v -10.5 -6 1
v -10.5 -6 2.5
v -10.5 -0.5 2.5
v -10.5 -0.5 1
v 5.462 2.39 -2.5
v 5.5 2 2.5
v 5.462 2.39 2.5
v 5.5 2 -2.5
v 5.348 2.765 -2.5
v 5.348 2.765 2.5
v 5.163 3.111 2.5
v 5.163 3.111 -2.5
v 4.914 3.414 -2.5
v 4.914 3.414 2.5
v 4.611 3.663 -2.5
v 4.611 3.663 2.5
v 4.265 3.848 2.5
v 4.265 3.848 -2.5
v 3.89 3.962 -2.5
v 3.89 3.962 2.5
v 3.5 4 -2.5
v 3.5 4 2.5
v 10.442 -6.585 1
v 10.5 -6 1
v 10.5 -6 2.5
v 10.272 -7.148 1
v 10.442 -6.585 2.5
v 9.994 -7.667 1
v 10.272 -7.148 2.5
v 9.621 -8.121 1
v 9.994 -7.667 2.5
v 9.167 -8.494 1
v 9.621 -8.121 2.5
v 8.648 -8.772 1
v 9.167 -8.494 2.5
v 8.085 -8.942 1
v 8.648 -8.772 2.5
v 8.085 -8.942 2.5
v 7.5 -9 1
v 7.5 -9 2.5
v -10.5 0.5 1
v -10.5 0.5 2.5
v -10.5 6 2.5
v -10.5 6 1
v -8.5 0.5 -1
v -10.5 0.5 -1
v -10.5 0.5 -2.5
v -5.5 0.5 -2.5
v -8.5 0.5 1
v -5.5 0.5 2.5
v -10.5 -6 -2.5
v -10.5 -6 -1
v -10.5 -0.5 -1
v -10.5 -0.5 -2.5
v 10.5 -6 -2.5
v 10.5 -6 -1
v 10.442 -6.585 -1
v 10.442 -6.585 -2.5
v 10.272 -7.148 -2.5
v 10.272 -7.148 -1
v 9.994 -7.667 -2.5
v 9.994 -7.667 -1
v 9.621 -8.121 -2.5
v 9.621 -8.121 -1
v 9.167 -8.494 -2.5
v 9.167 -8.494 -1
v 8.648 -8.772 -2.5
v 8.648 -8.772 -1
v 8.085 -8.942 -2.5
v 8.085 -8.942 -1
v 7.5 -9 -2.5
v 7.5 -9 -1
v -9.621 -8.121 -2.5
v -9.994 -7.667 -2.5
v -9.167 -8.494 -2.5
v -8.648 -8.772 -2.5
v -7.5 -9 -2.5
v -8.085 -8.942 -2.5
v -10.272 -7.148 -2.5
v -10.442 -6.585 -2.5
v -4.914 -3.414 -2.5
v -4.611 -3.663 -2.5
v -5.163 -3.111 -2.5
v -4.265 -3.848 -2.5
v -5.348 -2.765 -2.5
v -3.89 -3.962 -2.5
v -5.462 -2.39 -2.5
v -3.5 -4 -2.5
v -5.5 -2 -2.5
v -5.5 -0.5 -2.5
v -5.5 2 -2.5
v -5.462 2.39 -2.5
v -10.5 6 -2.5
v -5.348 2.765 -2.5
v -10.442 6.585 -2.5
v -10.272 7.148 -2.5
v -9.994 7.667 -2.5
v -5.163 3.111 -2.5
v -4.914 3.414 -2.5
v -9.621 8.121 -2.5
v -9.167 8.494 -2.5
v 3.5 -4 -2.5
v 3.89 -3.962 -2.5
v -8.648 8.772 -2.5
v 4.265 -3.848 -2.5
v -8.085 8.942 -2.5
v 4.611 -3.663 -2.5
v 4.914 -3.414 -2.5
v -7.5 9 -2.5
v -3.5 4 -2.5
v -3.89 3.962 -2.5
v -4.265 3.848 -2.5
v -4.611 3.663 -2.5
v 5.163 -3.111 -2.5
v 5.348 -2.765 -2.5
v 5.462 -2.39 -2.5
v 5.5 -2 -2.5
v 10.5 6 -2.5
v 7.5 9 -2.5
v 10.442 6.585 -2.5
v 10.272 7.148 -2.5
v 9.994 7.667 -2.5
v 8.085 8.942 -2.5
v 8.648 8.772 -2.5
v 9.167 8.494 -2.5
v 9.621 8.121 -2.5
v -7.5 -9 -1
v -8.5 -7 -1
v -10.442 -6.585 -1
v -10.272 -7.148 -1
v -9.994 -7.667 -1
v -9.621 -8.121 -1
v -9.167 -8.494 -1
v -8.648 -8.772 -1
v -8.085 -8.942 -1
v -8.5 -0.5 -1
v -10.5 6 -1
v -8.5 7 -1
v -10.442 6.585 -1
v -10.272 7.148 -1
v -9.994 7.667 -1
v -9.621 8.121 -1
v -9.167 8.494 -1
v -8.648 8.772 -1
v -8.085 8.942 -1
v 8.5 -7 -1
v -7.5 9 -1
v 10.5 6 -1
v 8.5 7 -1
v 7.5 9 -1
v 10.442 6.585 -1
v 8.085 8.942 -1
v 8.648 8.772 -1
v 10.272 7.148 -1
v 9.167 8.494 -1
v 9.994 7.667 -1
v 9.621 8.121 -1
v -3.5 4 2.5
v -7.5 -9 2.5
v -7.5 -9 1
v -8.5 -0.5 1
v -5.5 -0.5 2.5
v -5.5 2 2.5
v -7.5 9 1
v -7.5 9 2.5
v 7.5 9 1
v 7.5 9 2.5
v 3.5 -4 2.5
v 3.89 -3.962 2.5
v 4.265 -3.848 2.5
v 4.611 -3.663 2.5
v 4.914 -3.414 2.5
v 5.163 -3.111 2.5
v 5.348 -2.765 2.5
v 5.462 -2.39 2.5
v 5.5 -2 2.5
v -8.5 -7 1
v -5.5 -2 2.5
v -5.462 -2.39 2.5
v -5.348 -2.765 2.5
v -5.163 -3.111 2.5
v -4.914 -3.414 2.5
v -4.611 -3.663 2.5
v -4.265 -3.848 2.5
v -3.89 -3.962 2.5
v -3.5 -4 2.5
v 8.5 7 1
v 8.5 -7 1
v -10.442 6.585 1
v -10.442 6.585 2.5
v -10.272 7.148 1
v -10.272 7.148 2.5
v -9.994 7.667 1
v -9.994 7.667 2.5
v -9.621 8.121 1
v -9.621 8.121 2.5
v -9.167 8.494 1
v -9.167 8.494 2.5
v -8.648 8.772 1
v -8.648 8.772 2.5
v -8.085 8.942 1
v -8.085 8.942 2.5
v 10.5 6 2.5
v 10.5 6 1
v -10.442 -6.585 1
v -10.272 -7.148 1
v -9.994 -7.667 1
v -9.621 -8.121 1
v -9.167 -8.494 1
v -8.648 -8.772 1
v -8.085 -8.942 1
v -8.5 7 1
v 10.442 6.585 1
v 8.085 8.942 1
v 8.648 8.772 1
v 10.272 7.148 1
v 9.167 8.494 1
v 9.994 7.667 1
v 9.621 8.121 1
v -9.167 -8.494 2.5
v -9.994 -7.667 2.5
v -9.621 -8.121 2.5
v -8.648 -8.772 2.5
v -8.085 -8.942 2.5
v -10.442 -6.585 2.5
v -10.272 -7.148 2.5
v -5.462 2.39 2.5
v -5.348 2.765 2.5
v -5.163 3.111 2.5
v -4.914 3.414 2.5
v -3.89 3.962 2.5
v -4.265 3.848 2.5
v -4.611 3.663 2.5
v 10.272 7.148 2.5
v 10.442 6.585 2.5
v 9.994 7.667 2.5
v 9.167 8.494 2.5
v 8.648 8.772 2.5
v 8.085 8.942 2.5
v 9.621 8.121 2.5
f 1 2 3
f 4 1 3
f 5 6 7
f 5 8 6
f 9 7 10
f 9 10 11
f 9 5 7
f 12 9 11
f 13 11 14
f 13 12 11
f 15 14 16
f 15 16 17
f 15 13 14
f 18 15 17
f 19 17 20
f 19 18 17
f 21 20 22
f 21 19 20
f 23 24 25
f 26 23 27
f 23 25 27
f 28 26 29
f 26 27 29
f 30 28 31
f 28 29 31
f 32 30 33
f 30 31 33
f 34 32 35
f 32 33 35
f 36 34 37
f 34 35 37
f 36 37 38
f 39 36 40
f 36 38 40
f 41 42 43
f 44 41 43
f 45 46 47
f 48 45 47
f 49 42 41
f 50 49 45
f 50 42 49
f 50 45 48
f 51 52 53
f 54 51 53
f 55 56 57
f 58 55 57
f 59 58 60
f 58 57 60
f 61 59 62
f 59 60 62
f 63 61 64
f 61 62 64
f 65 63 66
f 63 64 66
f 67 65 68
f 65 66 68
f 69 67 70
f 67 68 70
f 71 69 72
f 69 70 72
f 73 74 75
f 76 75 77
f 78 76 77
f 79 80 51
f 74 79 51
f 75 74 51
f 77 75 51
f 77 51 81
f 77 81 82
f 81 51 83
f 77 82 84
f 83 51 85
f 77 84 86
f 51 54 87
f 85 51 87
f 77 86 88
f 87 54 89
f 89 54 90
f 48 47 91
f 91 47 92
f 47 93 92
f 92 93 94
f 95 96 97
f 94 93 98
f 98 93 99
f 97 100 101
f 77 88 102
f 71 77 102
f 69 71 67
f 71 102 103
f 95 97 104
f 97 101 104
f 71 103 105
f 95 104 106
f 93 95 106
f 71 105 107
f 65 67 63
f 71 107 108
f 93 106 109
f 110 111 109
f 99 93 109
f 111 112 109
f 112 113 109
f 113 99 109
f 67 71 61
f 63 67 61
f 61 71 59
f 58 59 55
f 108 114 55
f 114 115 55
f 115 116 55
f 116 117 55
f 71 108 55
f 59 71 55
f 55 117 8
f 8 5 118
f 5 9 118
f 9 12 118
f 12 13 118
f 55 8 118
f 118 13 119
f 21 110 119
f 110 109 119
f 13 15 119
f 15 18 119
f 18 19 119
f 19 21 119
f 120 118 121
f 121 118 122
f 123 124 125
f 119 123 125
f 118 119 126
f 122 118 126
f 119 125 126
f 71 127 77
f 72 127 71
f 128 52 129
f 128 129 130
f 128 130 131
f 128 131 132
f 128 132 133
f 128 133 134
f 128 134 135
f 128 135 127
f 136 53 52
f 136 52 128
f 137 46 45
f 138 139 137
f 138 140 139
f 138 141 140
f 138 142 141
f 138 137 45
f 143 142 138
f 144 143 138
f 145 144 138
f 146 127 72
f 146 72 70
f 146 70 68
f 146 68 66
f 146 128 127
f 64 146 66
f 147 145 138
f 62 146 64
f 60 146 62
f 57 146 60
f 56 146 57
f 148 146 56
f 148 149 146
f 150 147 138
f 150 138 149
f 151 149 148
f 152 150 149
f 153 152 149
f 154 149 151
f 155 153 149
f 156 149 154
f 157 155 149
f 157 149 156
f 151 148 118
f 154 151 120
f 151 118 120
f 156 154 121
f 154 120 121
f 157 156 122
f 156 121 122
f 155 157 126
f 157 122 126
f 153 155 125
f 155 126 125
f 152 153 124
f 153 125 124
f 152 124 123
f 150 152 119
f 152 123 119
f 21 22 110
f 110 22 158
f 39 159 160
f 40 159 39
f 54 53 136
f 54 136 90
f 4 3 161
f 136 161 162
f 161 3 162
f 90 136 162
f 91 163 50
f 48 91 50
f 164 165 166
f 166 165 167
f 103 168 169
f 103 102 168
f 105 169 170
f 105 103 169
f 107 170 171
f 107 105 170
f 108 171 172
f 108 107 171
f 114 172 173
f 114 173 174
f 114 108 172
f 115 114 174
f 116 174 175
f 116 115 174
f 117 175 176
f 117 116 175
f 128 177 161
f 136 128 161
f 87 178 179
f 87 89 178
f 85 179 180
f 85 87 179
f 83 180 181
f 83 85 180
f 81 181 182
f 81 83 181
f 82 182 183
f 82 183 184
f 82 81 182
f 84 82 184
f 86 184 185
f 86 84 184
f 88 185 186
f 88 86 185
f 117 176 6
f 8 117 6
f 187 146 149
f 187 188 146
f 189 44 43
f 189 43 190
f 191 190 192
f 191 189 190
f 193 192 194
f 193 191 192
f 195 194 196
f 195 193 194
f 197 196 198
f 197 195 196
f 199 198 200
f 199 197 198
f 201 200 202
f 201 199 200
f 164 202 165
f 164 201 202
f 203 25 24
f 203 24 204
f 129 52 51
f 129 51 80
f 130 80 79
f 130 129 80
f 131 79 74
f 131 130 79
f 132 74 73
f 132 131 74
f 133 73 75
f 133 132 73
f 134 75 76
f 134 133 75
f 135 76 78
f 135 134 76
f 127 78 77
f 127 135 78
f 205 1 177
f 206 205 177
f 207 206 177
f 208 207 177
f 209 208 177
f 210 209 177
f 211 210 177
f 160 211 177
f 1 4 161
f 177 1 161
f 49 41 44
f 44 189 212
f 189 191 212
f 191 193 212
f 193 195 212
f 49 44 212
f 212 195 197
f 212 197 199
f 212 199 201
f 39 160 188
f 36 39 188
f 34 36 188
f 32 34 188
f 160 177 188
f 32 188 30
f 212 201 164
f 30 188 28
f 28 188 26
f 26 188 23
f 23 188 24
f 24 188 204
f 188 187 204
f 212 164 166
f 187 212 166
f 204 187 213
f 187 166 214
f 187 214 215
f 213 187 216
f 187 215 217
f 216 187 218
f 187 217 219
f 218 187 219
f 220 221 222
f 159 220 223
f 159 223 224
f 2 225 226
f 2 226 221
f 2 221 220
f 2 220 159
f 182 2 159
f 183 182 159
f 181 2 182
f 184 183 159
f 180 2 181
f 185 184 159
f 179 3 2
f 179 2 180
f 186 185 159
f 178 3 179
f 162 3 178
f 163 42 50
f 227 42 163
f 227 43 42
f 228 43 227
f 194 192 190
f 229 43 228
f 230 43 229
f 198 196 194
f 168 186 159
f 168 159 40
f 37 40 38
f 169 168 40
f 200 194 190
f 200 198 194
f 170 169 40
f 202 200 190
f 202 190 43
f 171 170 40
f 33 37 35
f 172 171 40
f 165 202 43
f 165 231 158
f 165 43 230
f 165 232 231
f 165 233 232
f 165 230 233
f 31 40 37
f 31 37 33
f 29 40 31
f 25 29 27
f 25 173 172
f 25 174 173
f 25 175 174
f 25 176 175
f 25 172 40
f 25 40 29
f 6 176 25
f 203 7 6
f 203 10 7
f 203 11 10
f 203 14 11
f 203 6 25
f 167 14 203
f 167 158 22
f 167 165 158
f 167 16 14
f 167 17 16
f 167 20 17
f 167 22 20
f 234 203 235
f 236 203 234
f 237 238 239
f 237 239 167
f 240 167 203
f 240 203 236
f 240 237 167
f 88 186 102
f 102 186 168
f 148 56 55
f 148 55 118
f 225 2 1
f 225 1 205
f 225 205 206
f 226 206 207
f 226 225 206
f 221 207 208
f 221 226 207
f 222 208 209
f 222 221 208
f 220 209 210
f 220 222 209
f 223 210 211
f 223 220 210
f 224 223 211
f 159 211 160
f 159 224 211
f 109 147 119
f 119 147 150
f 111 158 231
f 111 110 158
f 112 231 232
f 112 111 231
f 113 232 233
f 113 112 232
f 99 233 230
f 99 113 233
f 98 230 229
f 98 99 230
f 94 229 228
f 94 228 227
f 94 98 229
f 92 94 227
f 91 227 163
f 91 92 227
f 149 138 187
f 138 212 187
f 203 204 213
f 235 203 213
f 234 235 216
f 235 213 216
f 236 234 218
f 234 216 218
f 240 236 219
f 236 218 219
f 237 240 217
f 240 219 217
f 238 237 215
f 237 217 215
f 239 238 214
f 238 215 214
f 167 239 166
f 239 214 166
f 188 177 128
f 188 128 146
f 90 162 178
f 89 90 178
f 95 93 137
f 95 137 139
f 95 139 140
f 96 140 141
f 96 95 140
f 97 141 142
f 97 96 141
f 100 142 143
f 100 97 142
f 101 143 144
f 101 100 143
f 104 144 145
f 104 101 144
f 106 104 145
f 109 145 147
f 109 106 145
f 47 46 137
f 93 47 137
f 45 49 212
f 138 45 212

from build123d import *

# Parameters (mm, degrees)
F0_W     = 21
F0_H     = 18
F0_W_2   = 17
F0_H_2   = 14
F1_DEPTH = 2.5
F2_R     = 3
F3_DEPTH = 1
F4_W     = 5
F4_H     = 1
F5_DEPTH = 25
F6_R     = 2


with BuildPart() as f1:
    # F0 (on Top) → F1 (new body, symmetric)
    with BuildSketch(Plane.XY):
        Rectangle(F0_W, F0_H)
        Rectangle(F0_W_2, F0_H_2, mode=Mode.SUBTRACT)
        Rectangle(F0_W_2, F0_H_2)
    extrude(amount=F1_DEPTH, both=True)

    # F2
    f2_edges = [f1.edges().sort_by_distance(p)[0] for p in [
        (10.5, -9, 0),
        (10.5, 9, 0),
        (-10.5, 9, 0),
        (-10.5, -9, 0),
    ]]
    fillet(f2_edges, radius=F2_R)

    # F0 (on Top) → F3 (cut, symmetric)
    with BuildSketch(Plane.XY):
        Rectangle(F0_W, F0_H)
        Rectangle(F0_W_2, F0_H_2, mode=Mode.SUBTRACT)
    extrude(amount=F3_DEPTH, both=True, mode=Mode.SUBTRACT)

    # F4 (on face) → F5 (cut)
    with BuildSketch(Plane.XY.offset(2.5)):
        Polygon((-5.5, -0.5), (-5.5, -4), (5.5, -4), (5.5, 4), (-5.5, 4), (-5.5, 0.5), align=None)
        with Locations((-8, 0)):
            Rectangle(F4_W, F4_H)
    extrude(amount=-F5_DEPTH, mode=Mode.SUBTRACT)

    # F6
    f6_edges = [f1.edges().sort_by_distance(p)[0] for p in [
        (-5.5, -4, 0),
        (5.5, -4, 0),
        (5.5, 4, 0),
        (-5.5, 4, 0),
    ]]
    fillet(f6_edges, radius=F6_R)


solid = f1.part
